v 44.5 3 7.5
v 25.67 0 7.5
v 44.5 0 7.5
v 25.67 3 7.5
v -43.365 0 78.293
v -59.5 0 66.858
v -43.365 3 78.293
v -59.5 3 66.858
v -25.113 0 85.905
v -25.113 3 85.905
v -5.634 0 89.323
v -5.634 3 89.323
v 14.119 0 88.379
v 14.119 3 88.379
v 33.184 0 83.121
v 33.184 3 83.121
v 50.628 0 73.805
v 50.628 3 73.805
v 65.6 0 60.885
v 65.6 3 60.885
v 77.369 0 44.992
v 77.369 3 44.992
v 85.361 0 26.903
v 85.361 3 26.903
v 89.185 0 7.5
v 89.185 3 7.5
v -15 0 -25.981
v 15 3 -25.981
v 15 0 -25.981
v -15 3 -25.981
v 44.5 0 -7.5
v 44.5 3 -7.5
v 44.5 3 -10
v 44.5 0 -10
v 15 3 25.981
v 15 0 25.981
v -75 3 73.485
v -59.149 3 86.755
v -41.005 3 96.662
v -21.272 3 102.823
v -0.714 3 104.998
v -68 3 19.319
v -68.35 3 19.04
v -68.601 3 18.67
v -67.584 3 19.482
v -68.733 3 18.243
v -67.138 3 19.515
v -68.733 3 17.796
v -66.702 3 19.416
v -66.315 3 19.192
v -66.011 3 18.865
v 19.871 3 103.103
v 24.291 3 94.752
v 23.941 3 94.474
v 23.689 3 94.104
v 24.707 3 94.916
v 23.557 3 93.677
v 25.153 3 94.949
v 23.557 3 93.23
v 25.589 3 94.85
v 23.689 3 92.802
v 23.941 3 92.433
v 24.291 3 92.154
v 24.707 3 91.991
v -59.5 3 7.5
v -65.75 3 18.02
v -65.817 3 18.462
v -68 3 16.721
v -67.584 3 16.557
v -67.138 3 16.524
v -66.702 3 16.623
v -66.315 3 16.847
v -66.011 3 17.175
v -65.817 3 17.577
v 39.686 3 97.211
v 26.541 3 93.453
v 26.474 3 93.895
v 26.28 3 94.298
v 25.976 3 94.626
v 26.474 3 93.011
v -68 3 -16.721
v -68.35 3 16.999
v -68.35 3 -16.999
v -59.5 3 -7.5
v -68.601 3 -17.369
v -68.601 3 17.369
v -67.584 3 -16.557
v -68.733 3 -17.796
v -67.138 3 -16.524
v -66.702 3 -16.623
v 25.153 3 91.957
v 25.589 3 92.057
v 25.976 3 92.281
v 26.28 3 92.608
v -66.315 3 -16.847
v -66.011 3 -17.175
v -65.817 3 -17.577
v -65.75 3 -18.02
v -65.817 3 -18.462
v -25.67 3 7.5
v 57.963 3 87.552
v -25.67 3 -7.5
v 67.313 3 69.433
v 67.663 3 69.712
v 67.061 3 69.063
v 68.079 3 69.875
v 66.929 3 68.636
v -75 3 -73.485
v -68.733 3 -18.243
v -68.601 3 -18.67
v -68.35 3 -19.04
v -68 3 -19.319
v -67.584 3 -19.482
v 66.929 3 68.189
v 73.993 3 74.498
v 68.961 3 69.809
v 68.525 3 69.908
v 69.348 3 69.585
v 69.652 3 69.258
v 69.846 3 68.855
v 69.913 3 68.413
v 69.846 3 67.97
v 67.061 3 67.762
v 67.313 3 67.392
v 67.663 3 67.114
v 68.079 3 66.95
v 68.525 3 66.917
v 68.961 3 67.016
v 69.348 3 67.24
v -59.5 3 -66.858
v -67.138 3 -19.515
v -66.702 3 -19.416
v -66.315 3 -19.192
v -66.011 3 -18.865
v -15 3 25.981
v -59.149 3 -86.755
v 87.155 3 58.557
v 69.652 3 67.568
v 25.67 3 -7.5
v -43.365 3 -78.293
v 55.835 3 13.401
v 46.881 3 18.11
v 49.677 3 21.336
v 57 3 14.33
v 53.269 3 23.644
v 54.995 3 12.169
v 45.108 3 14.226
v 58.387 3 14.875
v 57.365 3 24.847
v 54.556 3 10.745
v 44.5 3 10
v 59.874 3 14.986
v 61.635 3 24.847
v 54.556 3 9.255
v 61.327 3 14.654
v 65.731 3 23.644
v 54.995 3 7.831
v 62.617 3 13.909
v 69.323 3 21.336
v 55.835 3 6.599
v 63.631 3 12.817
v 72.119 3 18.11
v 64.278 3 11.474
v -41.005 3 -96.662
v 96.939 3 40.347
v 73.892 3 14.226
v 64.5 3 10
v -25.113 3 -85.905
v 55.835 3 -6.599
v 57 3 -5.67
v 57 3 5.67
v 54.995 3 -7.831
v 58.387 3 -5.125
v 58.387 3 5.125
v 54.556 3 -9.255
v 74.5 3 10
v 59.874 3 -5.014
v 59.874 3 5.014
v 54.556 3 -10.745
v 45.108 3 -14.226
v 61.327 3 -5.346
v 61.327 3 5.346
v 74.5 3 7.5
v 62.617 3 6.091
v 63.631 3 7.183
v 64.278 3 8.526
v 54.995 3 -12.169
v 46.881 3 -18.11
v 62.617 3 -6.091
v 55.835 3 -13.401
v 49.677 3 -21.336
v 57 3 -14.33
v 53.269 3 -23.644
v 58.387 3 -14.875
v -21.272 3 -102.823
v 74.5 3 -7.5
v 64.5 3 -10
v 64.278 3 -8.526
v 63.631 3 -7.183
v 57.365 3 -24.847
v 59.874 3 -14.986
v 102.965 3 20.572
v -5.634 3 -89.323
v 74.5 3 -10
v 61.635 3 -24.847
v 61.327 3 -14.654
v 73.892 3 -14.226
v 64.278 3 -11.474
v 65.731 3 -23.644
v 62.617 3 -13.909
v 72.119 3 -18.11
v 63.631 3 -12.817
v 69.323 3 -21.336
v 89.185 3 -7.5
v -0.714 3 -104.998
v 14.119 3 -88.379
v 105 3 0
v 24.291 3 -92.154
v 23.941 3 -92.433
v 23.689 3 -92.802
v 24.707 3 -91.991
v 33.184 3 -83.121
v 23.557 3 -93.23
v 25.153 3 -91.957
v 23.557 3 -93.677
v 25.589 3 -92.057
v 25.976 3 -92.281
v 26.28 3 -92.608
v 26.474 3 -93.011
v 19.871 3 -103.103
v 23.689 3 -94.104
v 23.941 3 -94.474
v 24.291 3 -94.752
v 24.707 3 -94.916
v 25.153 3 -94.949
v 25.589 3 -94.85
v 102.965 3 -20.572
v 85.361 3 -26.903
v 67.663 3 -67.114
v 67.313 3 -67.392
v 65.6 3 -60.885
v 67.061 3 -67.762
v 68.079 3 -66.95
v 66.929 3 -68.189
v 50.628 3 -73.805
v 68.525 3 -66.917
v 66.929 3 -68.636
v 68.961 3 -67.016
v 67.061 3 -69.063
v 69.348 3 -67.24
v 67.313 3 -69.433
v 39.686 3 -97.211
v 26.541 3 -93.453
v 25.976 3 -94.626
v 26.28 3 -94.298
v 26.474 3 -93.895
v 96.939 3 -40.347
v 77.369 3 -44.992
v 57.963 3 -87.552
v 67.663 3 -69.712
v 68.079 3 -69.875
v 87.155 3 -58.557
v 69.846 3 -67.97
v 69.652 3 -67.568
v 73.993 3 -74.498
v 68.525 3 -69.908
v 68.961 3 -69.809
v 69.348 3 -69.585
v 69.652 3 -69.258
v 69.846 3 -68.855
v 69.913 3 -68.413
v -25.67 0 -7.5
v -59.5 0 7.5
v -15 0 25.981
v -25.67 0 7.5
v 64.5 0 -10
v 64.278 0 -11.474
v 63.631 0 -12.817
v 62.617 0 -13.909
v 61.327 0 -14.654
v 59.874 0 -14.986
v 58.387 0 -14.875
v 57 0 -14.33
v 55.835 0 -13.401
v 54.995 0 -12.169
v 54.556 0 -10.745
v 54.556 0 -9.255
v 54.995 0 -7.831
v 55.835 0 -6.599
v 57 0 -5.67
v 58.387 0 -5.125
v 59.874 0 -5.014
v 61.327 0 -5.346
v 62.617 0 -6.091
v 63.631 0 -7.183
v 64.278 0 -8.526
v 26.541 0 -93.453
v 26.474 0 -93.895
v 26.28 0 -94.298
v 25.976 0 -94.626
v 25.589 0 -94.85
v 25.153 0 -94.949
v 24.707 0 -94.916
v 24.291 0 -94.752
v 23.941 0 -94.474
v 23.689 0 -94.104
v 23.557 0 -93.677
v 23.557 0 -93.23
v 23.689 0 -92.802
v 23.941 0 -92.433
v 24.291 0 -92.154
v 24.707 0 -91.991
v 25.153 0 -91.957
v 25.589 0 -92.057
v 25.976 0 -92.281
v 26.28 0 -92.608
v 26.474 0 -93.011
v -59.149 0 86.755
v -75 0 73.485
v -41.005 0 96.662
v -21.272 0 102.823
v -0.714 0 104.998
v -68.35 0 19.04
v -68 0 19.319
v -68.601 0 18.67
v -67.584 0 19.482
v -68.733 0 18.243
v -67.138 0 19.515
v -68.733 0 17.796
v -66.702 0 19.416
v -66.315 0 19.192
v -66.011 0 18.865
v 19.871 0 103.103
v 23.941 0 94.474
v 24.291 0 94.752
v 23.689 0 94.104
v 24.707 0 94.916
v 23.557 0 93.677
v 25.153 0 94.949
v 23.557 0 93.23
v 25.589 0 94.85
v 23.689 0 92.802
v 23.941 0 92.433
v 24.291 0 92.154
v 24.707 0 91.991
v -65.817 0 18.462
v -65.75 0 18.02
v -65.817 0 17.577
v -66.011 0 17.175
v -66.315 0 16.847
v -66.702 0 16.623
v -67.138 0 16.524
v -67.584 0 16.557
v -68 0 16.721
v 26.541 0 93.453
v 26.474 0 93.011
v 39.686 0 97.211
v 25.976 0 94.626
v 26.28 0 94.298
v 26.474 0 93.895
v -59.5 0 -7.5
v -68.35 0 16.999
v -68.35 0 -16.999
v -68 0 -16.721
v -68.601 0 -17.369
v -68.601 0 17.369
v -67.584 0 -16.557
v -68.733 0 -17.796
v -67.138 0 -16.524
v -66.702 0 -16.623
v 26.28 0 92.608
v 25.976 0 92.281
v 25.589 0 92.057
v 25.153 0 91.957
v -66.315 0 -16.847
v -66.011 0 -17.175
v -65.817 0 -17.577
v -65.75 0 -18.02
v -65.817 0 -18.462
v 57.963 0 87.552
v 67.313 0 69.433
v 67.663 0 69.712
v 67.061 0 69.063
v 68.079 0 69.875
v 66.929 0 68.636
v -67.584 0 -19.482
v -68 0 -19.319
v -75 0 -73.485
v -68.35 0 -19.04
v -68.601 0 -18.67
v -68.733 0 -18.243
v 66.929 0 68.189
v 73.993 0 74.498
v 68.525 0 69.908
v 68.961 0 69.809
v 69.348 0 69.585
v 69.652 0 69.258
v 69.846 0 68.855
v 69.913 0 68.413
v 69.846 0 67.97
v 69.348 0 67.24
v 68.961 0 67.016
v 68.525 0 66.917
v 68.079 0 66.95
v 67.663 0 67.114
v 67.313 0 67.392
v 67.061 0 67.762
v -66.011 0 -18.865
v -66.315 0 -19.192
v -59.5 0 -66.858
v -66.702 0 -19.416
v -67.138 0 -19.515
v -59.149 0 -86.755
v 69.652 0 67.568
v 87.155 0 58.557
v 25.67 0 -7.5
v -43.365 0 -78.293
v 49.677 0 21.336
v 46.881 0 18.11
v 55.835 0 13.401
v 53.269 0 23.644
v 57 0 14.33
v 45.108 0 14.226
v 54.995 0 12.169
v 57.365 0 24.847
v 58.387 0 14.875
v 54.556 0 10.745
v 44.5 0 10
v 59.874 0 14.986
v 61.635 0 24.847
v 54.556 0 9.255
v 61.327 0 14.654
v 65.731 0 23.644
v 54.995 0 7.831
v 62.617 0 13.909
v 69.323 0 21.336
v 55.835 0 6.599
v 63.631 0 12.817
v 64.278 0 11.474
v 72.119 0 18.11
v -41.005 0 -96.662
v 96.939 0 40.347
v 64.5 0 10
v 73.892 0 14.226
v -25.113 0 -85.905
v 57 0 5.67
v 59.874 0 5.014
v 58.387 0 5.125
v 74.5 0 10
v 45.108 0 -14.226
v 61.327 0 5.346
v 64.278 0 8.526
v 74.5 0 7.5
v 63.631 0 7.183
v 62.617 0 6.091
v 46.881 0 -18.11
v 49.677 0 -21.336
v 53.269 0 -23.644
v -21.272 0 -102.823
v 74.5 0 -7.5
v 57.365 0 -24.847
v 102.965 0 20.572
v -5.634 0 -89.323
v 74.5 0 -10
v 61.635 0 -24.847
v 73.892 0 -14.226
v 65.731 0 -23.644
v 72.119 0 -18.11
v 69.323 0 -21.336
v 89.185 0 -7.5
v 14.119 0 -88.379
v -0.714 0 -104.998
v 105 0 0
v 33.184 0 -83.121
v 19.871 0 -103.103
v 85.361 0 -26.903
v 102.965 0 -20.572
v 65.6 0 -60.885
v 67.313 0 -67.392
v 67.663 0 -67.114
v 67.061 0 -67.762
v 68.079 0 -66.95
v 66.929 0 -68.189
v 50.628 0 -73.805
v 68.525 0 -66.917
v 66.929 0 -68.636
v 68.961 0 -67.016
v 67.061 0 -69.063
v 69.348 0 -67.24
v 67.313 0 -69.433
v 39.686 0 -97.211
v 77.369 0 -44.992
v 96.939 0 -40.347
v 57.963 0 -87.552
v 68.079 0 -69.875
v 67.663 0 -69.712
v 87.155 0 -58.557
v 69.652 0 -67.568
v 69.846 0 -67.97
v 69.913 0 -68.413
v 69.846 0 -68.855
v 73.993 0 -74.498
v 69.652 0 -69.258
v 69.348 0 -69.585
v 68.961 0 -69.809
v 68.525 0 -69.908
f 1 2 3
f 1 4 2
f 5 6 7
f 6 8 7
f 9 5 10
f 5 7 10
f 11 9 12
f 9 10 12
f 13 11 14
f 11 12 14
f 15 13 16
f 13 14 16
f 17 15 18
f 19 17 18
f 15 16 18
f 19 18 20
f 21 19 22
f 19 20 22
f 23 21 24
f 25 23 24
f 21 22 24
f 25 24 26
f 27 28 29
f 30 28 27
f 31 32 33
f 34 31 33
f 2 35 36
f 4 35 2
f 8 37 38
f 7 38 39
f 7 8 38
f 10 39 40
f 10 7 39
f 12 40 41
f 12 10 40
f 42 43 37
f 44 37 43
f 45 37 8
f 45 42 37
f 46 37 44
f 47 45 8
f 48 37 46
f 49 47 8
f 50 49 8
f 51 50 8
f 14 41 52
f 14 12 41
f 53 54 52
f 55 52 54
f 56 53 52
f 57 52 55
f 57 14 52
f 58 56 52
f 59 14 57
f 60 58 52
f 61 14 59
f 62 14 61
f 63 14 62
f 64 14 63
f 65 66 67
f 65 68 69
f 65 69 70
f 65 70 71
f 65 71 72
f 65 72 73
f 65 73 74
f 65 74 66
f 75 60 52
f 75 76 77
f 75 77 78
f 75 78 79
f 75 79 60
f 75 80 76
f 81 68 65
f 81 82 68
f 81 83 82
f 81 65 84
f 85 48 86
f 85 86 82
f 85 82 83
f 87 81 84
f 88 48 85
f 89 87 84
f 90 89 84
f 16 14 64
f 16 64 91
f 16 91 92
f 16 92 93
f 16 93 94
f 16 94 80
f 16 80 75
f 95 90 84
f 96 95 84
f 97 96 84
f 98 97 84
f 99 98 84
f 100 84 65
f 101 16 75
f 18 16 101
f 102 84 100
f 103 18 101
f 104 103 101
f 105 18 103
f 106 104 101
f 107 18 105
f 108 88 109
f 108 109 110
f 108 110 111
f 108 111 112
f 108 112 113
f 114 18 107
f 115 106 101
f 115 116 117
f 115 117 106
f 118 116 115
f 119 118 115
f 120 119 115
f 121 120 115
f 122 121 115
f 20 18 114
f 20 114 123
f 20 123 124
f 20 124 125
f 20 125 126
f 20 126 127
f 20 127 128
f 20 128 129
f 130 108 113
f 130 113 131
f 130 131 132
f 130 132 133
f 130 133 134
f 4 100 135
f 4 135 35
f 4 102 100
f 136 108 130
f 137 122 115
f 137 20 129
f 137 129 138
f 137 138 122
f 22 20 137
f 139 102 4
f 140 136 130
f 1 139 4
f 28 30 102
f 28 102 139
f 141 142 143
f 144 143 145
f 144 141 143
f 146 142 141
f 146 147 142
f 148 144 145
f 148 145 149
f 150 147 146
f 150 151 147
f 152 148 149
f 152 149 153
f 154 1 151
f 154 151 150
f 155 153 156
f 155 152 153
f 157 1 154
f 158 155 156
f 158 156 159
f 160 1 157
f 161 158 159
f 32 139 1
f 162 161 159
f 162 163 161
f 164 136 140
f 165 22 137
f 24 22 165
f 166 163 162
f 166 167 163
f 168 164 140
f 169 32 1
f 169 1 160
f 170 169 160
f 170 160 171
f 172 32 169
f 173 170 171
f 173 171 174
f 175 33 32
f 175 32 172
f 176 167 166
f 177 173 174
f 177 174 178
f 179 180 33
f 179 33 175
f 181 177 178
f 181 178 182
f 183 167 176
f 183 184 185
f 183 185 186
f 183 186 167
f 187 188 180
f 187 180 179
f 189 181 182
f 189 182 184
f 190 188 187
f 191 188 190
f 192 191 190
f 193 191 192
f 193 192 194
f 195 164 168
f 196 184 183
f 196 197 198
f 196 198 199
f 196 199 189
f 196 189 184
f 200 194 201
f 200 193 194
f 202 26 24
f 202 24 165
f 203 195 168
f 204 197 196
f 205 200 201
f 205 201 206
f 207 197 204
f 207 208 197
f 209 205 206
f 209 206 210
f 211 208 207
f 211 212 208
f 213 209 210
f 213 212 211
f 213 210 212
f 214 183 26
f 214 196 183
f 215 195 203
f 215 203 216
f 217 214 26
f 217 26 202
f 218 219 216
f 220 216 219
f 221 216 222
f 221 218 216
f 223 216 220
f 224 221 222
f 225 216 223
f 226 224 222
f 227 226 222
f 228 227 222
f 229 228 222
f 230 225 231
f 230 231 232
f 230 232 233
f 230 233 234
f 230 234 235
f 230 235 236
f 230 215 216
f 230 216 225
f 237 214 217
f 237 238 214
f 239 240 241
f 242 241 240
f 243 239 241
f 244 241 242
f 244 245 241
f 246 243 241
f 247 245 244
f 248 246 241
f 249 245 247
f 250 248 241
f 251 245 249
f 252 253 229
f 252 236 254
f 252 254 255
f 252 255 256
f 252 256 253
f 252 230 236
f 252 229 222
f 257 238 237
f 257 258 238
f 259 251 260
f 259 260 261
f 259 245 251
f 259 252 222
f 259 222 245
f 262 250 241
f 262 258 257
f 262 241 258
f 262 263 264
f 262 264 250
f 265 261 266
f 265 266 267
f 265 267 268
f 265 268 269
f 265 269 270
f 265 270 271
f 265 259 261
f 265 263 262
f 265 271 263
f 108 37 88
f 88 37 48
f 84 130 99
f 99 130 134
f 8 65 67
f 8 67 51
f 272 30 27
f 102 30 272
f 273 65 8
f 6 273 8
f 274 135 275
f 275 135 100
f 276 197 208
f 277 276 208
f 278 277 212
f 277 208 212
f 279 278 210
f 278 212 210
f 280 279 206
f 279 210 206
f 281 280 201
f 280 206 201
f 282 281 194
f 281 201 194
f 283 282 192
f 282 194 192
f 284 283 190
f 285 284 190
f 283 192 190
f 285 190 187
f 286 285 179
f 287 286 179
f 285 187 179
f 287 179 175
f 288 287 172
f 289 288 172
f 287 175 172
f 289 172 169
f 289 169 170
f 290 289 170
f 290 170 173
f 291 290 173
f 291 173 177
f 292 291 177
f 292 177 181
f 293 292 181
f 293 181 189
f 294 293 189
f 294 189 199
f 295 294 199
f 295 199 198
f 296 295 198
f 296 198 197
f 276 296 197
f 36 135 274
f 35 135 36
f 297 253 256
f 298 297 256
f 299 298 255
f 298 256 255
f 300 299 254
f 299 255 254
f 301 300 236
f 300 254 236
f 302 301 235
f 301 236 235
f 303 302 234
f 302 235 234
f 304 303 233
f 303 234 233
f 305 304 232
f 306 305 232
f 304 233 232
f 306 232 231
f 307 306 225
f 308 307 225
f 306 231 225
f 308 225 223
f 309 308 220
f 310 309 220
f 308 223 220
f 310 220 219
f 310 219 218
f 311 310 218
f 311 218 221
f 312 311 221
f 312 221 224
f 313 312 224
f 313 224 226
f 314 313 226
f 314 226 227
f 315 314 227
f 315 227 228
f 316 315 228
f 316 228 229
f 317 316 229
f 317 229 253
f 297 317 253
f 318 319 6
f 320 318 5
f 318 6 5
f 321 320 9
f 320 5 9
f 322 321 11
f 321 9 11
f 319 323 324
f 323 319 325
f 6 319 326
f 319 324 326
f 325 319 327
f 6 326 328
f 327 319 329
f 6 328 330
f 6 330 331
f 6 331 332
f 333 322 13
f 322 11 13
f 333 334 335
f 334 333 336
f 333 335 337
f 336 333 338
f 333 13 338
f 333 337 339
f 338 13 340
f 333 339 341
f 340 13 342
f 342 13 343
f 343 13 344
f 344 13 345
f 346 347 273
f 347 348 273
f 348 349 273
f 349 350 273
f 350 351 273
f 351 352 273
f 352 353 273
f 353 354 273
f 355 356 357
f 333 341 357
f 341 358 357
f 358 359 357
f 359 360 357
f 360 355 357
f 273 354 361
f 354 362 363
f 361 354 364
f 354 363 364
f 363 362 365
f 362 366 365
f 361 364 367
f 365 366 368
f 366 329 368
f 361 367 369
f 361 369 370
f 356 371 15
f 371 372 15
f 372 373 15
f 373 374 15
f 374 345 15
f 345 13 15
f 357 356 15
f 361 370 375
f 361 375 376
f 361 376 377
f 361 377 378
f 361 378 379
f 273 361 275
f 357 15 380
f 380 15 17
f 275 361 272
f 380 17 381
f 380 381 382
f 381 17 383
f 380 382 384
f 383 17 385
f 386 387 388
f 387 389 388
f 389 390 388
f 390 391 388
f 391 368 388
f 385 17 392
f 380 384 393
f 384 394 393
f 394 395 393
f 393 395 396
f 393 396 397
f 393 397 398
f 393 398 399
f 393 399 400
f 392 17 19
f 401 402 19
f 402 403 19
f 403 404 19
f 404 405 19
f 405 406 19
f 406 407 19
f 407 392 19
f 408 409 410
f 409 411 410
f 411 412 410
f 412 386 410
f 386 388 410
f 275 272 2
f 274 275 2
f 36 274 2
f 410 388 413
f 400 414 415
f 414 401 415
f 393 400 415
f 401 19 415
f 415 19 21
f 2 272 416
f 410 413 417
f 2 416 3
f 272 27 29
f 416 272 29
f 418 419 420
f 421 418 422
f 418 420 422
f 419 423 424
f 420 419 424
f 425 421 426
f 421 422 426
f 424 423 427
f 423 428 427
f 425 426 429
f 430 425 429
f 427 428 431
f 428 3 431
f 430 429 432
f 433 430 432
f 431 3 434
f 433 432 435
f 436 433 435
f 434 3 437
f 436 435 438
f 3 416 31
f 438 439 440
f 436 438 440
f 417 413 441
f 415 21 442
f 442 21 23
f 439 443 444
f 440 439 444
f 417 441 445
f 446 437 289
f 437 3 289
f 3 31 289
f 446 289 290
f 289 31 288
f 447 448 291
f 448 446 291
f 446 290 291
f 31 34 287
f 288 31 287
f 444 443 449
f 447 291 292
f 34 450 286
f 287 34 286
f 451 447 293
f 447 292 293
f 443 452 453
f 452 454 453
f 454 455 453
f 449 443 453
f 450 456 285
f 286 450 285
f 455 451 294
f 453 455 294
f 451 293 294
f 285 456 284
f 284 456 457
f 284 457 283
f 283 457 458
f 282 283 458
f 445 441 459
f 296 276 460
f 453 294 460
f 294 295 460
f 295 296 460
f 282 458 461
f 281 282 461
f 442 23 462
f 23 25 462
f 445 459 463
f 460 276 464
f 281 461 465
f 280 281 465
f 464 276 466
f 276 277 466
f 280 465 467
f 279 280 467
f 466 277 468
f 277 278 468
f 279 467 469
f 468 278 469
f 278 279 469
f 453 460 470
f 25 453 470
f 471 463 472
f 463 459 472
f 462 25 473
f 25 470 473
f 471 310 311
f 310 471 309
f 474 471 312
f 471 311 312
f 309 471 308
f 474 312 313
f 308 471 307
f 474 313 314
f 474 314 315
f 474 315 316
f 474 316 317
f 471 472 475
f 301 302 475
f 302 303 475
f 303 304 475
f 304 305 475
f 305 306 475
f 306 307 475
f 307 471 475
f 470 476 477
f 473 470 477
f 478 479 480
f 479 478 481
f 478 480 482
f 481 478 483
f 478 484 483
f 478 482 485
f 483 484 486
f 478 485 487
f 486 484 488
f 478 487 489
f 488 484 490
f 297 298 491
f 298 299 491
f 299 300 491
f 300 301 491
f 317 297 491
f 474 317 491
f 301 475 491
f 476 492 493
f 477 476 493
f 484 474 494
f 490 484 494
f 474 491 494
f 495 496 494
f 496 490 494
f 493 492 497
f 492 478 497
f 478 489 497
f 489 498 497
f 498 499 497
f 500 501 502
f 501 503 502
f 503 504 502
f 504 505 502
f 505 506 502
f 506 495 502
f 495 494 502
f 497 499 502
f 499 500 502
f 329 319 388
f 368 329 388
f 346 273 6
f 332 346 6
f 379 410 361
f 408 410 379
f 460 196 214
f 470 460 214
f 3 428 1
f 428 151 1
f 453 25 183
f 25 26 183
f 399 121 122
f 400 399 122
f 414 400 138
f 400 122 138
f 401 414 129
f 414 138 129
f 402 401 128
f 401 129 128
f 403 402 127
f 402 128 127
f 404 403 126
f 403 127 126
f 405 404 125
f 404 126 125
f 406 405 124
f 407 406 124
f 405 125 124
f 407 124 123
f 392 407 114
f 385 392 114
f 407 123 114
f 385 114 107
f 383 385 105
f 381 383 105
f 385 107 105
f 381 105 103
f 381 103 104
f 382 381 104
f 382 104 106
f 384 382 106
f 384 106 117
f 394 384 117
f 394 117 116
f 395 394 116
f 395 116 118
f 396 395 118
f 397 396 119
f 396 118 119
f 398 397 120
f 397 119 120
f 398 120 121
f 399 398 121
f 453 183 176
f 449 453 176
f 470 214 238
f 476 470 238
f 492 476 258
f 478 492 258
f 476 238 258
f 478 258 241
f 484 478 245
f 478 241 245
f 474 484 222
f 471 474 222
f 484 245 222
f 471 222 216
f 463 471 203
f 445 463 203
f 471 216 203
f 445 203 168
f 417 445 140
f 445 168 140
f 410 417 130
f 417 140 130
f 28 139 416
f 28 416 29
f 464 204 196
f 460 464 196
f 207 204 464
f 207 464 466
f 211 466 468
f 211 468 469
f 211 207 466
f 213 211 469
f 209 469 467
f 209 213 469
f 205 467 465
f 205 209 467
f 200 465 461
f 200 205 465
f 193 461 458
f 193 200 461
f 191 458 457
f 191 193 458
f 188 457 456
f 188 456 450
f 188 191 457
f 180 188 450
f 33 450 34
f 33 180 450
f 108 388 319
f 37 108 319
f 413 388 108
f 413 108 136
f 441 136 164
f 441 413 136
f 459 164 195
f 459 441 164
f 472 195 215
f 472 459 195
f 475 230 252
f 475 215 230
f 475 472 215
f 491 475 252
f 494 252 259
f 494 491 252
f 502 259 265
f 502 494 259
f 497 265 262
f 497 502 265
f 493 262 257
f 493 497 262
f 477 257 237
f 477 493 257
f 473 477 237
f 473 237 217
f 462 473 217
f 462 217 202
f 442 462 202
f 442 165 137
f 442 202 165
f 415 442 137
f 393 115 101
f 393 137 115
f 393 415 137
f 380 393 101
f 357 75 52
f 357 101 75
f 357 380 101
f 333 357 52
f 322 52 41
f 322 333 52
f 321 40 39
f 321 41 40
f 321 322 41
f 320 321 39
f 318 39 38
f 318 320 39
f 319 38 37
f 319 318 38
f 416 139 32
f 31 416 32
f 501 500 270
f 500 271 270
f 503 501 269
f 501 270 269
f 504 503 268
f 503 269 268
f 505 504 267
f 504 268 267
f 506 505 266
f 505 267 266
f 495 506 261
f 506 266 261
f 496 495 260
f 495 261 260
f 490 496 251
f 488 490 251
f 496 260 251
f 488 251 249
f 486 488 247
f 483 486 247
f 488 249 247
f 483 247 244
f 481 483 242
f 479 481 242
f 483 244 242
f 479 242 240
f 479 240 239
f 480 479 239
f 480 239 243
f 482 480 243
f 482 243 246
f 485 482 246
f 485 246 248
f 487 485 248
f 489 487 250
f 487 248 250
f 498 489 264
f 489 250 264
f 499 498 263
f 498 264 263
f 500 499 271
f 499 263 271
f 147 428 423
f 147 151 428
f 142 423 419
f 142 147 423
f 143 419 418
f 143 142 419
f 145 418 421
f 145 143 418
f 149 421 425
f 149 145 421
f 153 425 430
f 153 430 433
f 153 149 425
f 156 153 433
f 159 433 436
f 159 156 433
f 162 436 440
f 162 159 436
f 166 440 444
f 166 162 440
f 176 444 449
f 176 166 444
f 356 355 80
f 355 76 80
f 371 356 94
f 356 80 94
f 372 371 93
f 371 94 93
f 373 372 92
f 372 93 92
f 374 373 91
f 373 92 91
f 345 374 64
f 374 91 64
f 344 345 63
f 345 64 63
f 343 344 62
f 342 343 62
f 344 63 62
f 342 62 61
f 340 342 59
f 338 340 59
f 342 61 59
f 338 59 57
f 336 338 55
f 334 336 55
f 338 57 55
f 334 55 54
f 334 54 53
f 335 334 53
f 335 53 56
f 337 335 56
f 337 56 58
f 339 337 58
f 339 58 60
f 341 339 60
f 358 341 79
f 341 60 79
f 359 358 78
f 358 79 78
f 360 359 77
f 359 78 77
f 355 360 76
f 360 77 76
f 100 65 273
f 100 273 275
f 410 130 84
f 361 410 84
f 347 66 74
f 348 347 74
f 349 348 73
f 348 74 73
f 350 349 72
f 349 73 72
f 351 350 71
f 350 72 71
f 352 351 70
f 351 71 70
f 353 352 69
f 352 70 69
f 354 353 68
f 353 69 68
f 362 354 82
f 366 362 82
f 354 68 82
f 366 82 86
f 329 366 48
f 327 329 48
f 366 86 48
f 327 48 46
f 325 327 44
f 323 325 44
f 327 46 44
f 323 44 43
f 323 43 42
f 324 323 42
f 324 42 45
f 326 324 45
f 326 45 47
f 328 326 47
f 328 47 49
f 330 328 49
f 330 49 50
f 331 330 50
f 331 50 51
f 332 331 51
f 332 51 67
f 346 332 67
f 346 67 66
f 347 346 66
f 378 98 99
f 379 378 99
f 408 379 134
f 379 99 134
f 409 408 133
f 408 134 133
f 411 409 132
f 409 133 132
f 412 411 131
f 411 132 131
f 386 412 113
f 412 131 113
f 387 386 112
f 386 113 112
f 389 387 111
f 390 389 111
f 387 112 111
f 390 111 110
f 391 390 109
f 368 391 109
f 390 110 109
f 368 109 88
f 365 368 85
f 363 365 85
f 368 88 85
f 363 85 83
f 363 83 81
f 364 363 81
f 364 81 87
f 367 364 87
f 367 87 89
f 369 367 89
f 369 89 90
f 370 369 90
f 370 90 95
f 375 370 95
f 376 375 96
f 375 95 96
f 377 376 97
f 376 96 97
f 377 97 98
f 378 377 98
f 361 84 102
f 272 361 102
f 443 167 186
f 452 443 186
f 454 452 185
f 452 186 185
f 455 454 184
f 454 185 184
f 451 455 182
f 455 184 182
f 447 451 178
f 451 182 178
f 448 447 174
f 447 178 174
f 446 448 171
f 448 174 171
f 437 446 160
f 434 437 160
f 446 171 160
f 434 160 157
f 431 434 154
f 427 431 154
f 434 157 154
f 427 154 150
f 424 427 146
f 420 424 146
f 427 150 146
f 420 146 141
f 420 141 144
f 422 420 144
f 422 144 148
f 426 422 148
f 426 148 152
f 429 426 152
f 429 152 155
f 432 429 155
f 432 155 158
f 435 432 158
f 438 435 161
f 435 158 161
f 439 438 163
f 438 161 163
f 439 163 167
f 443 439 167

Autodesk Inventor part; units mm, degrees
ref_plane "YZ Plane" through (0, 0, 0) normal (1, 0, 0) x (0, 1, 0)
ref_plane "XZ Plane" through (0, 0, 0) normal (0, 1, 0) x (-1, 0, 0)
ref_plane "XY Plane" through (0, 0, 0) normal (0, 0, 1) x (1, 0, 0)
sketch "Sketch1" plane through (0, 0, 0) normal (0, 1, 0) x (-1, 0, 0)
  circle A0 centre (0, 0) radius 105
  line L0 (105, 0) -> (75, 0)
  line L1 (75, 0) -> (75, -73.4847)
  line L2 (75, 0) -> (75, 73.4847)
  dimension "d0" = 210
  dimension "d1" = 30
extrude "Extrusion1" add sketch "Sketch1" along normal blind 3 contours L2 L1 A0
sketch "Sketch2" plane through (0, 3, 0) normal (0, 1, 0) x (1, 0, 0)
  line L0 (-75, 73.4847) -> (-75, -73.4847) projected
  line L1 (-75, 0) -> (-67.25, 0)
  line L2 (-67.25, 0) -> (-67.25, -52.6096)
  line L3 (-67.25, -52.6096) -> (-67.25, 59.9001)
  line L4 (0, 0) -> (-67.25, -18.0196)
  line L5 (0, 0) -> (69.6223, 0) construction
  line L6 (0, 0) -> (-67.25, 18.0196)
  line L7 (0, 0) -> (69.6223, 0) construction
  line L8 (0, 0) -> (25.0407, -93.4533)
  line L9 (0, 0) -> (96.75, 0) construction
  line L10 (0, 0) -> (68.4126, -68.4126)
  line L11 (0, 0) -> (96.75, 0) construction
  line L12 (0, 0) -> (25.0407, 93.4533)
  line L13 (0, 0) -> (96.75, 0) construction
  line L14 (0, 0) -> (68.4126, 68.4126)
  line L15 (0, 0) -> (96.75, 0) construction
  circle A0 centre (-67.25, 18.0196) radius 1.5
  circle A1 centre (-67.25, -18.0196) radius 1.5
  circle A2 centre (25.0407, 93.4533) radius 1.5
  circle A3 centre (68.4126, 68.4126) radius 1.5
  circle A4 centre (68.4126, -68.4126) radius 1.5
  circle A5 centre (25.0407, -93.4533) radius 1.5
  dimension "d4" = 7.75
  dimension "d5" = 165
  dimension "d6" = 165
  dimension "d7" = 96.75
  dimension "d8" = 75
  dimension "d9" = 96.75
  dimension "d10" = 45
  dimension "d11" = 96.75
  dimension "d12" = 75
  dimension "d13" = 96.75
  dimension "d14" = 45
  dimension "d15" = 3
  dimension "d16" = 3
  dimension "d17" = 3
  dimension "d18" = 3
  dimension "d19" = 3
  dimension "d20" = 3
extrude "Extrusion2" cut sketch "Sketch2" against normal blind 3 contours A1 L4 L2 | L2 A1 | A0 L3 | L3 L6 A0 | L4 A1 L2 | L3 A0 L6 | A2 | A3 | A4 | A5
sketch "Sketch3" plane through (0, 3, 0) normal (0, 1, 0) x (1, 0, 0)
  circle A0 centre (-67.25, -18.0196) radius 1.5 projected
  line L0 (-67.25, -18.0196) -> (-75, -18.0196)
  line L1 (-75, 73.4847) -> (-75, -73.4847) projected
  line L2 (-75, -18.0196) -> (-59.5, -18.0196)
  line L3 (-59.5, -18.0196) -> (-59.5, -66.8581)
  line L4 (-59.5, -18.0196) -> (-59.5, 66.8581)
  arc A1 (-59.5, -66.8581) -> (-59.5, 66.8581) centre (0, 0) ccw
  point P0 (0, 0)
  dimension "d23" = 15.5
extrude "Extrusion3" cut sketch "Sketch3" against normal blind 3 contours L4 A1 L3
sketch "Sketch4" plane through (0, 3, 0) normal (0, 1, 0) x (1, 0, 0)
  arc A0 (-59.5, -66.8581) -> (-59.5, 66.8581) centre (0, 0) ccw projected
  line L0 (89.5, 0) -> (59.5, 0)
  line L1 (59.5, 0) -> (59.5, 10)
  line L2 (59.5, 10) -> (59.5, -10)
  circle A1 centre (59.5, -10) radius 5
  circle A2 centre (59.5, 10) radius 5
  circle A3 centre (59.5, 10) radius 15
  circle A4 centre (59.5, -10) radius 15
  line L3 (44.5, -10) -> (44.5, 10)
  line L4 (74.5, 10) -> (74.5, -10)
  point P0 (0, 0)
  dimension "d27" = 30
  dimension "d28" = 10
  dimension "d29" = 20
  dimension "d30" = 10
  dimension "d31" = 10
extrude "Extrusion4" add sketch "Sketch4" against normal blind 3
sketch "Sketch5" plane through (0, 3, 0) normal (0, 1, 0) x (1, 0, 0)
  line L0 (44.5, -10) -> (44.5, 10) projected
  line L1 (44.5, 0) -> (-59.5, 0)
  line L2 (-59.5, 66.8581) -> (-59.5, -66.8581) projected
  line L3 (-41.4459, 0) -> (-41.4459, 7.5)
  line L4 (-41.4459, 7.5) -> (-41.4459, -7.5)
  line L5 (-41.4459, -7.5) -> (-59.5, -7.5)
  line L6 (-41.4459, -7.5) -> (44.5, -7.5)
  line L7 (-41.4459, 7.5) -> (-59.5, 7.5)
  line L8 (-41.4459, 7.5) -> (44.5, 7.5)
  point P0 (0, 0)
  dimension "d34" = 7.5
  dimension "d35" = 15
extrude "Extrusion5" add sketch "Sketch5" against normal blind 3 contours L1 L3 L8 L0 | L5 L2 L1 L4 | L1 L2 L7 L3
sketch "Sketch6" plane through (0, 3, 0) normal (0, 1, 0) x (1, 0, 0)
  line L0 (-41.4459, -7.5) -> (-41.4459, 0) projected
  line L1 (-41.4459, 0) -> (44.5, 0) projected
  line L2 (-41.4459, -7.5) -> (44.5, -7.5)
  line L3 (44.5, -7.5) -> (44.5, 0)
  line L4 (44.5, 0) -> (-41.4459, 0)
  line L5 (-41.4459, 0) -> (-41.4459, -7.5)
  point P0 (0, 0)
extrude "Extrusion6" add sketch "Sketch6" against normal blind 3
sketch "Sketch7" plane through (0, 3, 0) normal (0, 1, 0) x (1, 0, 0)
  line L0 (44.5, -7.5) -> (-59.5, -7.5) projected
  line L1 (74.5, 10) -> (74.5, -10) projected
  line L2 (44.5, -7.5) -> (74.5, -7.5)
  line L3 (74.5, -7.5) -> (74.5, 7.5)
  line L4 (74.5, 7.5) -> (44.5, 7.5)
  line L5 (44.5, 7.5) -> (44.5, -7.5)
  line L6 (74.5, 7.5) -> (92.1337, 7.5)
  line L7 (92.1337, 7.5) -> (92.1337, -7.5)
  line L8 (92.1337, -7.5) -> (74.5, -7.5)
  line L9 (74.5, -7.5) -> (74.5, 7.5)
  point P0 (0, 0)
  dimension "d40" = 15
extrude "Extrusion7" add sketch "Sketch7" against normal blind 3 contours L6 L7 L8 L1
sketch "Sketch8" plane through (0, 3, 0) normal (0, 1, 0) x (1, 0, 0)
  line L0 (0, 0) -> (-30, 0)
  line L1 (0, 0) -> (-15, 25.9808)
  line L2 (0, 0) -> (30, 0) construction
  line L3 (-15, 25.9808) -> (-30, 0)
  line L4 (0, 0) -> (15, 25.9808)
  line L5 (15, 25.9808) -> (-15, 25.9808)
  line L6 (0, 0) -> (30, 0)
  line L7 (30, 0) -> (15, 25.9808)
  line L8 (0, 0) -> (15, -25.9808)
  line L9 (15, -25.9808) -> (30, 0)
  line L10 (0, 0) -> (-15, -25.9808)
  line L11 (-15, -25.9808) -> (15, -25.9808)
  line L12 (-15, -25.9808) -> (-30, 0)
  dimension "d43" = 30
  dimension "d44" = 30
  dimension "d45" = 120
extrude "Extrusion8" add sketch "Sketch8" against normal blind 3 contours L10 L12 L0 | L0 L3 L1 | L4 L7 L6 | L6 L9 L8 | L8 L11 L10
sketch "Sketch9" plane through (0, 3, 0) normal (0, 1, 0) x (1, 0, 0)
  line L0 (4.3301, 7.5) -> (15, 25.9808) projected
  line L1 (-25.6699, 7.5) -> (-15, 25.9808) projected
  line L2 (15, 25.9808) -> (-15, 25.9808)
  line L3 (-15, 25.9808) -> (-4.3301, 7.5) projected
  line L4 (-15, 25.9808) -> (-4.3301, 7.5)
  line L5 (-4.3301, 7.5) -> (4.3988, 7.5)
  line L6 (-4.3301, 7.5) -> (4.3301, 7.5) projected
  line L7 (25.6699, 7.5) -> (15, 25.9808) projected
  line L8 (4.3301, 7.5) -> (15, 25.9808)
  point P0 (0, 0)
extrude "Extrusion9" add sketch "Sketch9" against normal blind 3
properties part number "Top Plate1"
